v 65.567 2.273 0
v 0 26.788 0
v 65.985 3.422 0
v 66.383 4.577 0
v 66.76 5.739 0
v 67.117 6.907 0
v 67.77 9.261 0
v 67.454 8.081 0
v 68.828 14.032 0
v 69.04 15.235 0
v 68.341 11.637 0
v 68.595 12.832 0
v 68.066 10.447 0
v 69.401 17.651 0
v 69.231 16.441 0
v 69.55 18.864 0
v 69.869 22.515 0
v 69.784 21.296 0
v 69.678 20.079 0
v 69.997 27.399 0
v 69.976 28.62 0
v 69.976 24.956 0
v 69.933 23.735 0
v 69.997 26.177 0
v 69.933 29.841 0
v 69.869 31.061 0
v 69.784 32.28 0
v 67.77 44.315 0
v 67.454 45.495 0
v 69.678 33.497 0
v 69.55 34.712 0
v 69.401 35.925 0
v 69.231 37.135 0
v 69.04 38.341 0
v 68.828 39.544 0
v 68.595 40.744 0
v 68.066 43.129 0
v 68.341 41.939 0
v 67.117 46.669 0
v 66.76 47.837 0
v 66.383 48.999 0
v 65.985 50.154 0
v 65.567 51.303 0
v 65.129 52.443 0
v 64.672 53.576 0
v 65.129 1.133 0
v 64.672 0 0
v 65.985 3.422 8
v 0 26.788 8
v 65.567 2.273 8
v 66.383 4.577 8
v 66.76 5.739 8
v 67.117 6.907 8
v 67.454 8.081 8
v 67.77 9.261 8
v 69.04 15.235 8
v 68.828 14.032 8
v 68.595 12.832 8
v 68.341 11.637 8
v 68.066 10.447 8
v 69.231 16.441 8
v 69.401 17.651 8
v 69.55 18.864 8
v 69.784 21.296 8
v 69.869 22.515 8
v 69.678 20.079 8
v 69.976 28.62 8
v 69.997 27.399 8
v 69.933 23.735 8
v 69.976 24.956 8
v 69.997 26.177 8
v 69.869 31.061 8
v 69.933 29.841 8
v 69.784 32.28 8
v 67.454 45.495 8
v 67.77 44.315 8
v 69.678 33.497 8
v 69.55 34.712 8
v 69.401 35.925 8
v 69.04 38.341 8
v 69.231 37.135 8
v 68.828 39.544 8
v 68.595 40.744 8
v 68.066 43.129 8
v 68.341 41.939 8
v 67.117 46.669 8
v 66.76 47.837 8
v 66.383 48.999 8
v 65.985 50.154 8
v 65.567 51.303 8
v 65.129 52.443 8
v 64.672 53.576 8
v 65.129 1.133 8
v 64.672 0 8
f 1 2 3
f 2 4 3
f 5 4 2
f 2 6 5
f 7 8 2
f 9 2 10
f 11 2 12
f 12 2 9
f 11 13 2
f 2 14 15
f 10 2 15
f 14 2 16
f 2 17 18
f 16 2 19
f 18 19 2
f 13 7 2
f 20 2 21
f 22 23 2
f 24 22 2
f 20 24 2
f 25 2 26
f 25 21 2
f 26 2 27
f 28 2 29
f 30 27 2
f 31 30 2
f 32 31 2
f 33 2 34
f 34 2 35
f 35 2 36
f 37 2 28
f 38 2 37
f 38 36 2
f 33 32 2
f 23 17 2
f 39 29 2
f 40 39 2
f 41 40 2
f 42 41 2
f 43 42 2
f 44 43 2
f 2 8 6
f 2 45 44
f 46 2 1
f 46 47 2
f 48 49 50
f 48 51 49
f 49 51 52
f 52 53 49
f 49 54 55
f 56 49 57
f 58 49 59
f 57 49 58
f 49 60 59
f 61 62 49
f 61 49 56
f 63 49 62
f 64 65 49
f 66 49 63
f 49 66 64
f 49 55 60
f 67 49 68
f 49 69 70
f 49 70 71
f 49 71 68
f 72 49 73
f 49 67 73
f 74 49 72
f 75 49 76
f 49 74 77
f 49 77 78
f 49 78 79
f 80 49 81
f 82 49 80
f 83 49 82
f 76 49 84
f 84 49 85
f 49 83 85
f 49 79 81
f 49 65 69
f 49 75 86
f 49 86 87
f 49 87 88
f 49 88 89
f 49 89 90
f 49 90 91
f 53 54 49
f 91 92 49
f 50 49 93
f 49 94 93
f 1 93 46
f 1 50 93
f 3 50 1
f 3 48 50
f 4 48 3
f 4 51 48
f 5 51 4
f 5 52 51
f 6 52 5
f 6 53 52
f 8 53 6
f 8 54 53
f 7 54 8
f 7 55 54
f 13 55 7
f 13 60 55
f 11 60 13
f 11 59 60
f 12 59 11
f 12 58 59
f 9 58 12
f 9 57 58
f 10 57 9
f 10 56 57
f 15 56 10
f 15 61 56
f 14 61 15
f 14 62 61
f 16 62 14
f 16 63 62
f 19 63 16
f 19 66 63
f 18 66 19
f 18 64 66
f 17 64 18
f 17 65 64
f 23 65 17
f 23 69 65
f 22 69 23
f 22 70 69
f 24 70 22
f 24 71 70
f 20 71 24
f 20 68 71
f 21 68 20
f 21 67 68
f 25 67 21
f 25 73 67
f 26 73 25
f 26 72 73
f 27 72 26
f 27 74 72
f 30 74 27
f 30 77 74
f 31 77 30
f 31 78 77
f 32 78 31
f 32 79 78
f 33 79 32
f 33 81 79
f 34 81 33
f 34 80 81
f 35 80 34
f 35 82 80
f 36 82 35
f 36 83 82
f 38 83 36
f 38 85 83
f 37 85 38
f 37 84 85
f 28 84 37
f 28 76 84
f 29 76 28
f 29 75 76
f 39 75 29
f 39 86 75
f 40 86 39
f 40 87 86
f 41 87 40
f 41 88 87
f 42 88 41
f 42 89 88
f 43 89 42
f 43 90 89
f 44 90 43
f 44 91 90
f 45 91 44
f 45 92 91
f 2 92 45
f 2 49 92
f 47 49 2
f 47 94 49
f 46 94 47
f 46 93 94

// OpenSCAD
$fn = 32;
// target_bbox: 69.997, 53.576, 8
// ----------------------------------------------------------------------
// Arc profile plate: sector, 47 points
// ----------------------------------------------------------------------

// --- parameters (mm) ---
sector_angle = 45;        // sector angle, degrees
sector_r = 70;            // outer radius
arc_step = 1;             // sampling step of the arc, degrees
plate_t = 8;              // plate thickness, Z
fit_tol = 0.02;           // declared fit tolerance (prompt contract)
free_tol = 0.2;           // declared free tolerance (prompt contract)

bbox_x = 2 * sector_r * sin(sector_angle / 2);  // chord of the sector
bbox_y = sector_r;  // depth of the sector (apex to arc)

profile = [[64.672, 0], [65.129, 1.133], [65.567, 2.273], [65.985, 3.422], [66.383, 4.577], [66.76, 5.739], [67.117, 6.907], [67.454, 8.081], [67.77, 9.261], [68.066, 10.447], [68.341, 11.637], [68.595, 12.832], [68.828, 14.032], [69.04, 15.235], [69.231, 16.441], [69.401, 17.651], [69.55, 18.864], [69.678, 20.079], [69.784, 21.296], [69.869, 22.515], [69.933, 23.735], [69.976, 24.956], [69.997, 26.177], [69.997, 27.399], [69.976, 28.62], [69.933, 29.841], [69.869, 31.061], [69.784, 32.28], [69.678, 33.497], [69.55, 34.712], [69.401, 35.925], [69.231, 37.135], [69.04, 38.341], [68.828, 39.544], [68.595, 40.744], [68.341, 41.939], [68.066, 43.129], [67.77, 44.315], [67.454, 45.495], [67.117, 46.669], [66.76, 47.837], [66.383, 48.999], [65.985, 50.154], [65.567, 51.303], [65.129, 52.443], [64.672, 53.576], [0, 26.788]];  // primary outline, 47 points, counter clockwise

// --- the one profile operation ---
linear_extrude(height = plate_t) polygon(points = profile);
